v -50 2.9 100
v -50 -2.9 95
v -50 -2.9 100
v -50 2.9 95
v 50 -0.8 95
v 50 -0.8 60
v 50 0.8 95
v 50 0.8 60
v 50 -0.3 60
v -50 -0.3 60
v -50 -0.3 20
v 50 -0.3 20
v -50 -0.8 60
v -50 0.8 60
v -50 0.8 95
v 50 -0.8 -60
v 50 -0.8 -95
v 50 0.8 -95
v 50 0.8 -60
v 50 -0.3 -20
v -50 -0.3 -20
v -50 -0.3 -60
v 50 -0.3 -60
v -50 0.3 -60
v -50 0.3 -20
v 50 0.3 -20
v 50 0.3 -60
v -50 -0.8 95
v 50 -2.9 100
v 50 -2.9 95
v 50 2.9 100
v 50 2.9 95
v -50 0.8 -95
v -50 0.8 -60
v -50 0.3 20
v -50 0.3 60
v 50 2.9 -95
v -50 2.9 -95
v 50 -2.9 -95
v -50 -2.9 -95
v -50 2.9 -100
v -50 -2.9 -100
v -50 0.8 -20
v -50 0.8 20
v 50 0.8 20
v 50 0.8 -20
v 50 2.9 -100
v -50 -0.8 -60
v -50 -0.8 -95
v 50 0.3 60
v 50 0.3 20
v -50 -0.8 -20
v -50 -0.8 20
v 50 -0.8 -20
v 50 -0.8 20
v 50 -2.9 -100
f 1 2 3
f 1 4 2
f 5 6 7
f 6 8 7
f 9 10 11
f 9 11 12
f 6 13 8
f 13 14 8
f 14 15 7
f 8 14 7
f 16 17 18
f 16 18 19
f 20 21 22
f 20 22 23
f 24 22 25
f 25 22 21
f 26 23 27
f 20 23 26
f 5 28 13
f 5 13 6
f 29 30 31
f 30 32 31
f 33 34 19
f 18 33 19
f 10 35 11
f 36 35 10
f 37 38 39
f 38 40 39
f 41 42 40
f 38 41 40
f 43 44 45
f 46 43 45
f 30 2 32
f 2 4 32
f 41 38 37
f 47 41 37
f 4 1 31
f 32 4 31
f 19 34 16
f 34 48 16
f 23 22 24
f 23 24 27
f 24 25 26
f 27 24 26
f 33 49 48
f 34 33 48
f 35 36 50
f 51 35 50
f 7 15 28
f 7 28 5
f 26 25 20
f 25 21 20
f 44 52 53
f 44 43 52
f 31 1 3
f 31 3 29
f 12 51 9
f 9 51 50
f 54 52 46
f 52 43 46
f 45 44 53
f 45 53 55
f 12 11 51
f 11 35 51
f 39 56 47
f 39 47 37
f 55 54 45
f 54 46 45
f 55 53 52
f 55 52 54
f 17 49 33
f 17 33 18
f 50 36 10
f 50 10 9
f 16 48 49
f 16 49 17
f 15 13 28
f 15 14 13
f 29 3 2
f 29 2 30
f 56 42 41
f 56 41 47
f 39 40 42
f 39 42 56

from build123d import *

# Parameters (mm, degrees)
F0_W     = 100
F0_H     = 5
F1_DEPTH = 2.9
F0_H_2   = 35
F0_H_3   = 40
F2_DEPTH = 0.8
F3_DEPTH = 0.3


with BuildPart() as f1:
    # F0 (on Front) → F1 (new body, symmetric)
    with BuildSketch(Plane.XZ):
        with Locations((0, 97.5)):
            Rectangle(F0_W, F0_H)
        with Locations((0, -97.5)):
            Rectangle(F0_W, F0_H)
    extrude(amount=F1_DEPTH, both=True)


with BuildPart() as f2:
    # F0 (on Front) → F2 (new body, symmetric)
    with BuildSketch(Plane.XZ):
        with Locations((0, 77.5)):
            Rectangle(F0_W, F0_H_2)
        Rectangle(F0_W, F0_H_3)
        with Locations((0, -77.5)):
            Rectangle(F0_W, F0_H_2)
    extrude(amount=F2_DEPTH, both=True)


with BuildPart() as f3:
    # F0 (on Front) → F3 (new body, symmetric)
    with BuildSketch(Plane.XZ):
        with Locations((0, 40)):
            Rectangle(F0_W, F0_H_3)
        with Locations((0, -40)):
            Rectangle(F0_W, F0_H_3)
    extrude(amount=F3_DEPTH, both=True)


solid = Compound([f1.part, f2.part, f3.part])
